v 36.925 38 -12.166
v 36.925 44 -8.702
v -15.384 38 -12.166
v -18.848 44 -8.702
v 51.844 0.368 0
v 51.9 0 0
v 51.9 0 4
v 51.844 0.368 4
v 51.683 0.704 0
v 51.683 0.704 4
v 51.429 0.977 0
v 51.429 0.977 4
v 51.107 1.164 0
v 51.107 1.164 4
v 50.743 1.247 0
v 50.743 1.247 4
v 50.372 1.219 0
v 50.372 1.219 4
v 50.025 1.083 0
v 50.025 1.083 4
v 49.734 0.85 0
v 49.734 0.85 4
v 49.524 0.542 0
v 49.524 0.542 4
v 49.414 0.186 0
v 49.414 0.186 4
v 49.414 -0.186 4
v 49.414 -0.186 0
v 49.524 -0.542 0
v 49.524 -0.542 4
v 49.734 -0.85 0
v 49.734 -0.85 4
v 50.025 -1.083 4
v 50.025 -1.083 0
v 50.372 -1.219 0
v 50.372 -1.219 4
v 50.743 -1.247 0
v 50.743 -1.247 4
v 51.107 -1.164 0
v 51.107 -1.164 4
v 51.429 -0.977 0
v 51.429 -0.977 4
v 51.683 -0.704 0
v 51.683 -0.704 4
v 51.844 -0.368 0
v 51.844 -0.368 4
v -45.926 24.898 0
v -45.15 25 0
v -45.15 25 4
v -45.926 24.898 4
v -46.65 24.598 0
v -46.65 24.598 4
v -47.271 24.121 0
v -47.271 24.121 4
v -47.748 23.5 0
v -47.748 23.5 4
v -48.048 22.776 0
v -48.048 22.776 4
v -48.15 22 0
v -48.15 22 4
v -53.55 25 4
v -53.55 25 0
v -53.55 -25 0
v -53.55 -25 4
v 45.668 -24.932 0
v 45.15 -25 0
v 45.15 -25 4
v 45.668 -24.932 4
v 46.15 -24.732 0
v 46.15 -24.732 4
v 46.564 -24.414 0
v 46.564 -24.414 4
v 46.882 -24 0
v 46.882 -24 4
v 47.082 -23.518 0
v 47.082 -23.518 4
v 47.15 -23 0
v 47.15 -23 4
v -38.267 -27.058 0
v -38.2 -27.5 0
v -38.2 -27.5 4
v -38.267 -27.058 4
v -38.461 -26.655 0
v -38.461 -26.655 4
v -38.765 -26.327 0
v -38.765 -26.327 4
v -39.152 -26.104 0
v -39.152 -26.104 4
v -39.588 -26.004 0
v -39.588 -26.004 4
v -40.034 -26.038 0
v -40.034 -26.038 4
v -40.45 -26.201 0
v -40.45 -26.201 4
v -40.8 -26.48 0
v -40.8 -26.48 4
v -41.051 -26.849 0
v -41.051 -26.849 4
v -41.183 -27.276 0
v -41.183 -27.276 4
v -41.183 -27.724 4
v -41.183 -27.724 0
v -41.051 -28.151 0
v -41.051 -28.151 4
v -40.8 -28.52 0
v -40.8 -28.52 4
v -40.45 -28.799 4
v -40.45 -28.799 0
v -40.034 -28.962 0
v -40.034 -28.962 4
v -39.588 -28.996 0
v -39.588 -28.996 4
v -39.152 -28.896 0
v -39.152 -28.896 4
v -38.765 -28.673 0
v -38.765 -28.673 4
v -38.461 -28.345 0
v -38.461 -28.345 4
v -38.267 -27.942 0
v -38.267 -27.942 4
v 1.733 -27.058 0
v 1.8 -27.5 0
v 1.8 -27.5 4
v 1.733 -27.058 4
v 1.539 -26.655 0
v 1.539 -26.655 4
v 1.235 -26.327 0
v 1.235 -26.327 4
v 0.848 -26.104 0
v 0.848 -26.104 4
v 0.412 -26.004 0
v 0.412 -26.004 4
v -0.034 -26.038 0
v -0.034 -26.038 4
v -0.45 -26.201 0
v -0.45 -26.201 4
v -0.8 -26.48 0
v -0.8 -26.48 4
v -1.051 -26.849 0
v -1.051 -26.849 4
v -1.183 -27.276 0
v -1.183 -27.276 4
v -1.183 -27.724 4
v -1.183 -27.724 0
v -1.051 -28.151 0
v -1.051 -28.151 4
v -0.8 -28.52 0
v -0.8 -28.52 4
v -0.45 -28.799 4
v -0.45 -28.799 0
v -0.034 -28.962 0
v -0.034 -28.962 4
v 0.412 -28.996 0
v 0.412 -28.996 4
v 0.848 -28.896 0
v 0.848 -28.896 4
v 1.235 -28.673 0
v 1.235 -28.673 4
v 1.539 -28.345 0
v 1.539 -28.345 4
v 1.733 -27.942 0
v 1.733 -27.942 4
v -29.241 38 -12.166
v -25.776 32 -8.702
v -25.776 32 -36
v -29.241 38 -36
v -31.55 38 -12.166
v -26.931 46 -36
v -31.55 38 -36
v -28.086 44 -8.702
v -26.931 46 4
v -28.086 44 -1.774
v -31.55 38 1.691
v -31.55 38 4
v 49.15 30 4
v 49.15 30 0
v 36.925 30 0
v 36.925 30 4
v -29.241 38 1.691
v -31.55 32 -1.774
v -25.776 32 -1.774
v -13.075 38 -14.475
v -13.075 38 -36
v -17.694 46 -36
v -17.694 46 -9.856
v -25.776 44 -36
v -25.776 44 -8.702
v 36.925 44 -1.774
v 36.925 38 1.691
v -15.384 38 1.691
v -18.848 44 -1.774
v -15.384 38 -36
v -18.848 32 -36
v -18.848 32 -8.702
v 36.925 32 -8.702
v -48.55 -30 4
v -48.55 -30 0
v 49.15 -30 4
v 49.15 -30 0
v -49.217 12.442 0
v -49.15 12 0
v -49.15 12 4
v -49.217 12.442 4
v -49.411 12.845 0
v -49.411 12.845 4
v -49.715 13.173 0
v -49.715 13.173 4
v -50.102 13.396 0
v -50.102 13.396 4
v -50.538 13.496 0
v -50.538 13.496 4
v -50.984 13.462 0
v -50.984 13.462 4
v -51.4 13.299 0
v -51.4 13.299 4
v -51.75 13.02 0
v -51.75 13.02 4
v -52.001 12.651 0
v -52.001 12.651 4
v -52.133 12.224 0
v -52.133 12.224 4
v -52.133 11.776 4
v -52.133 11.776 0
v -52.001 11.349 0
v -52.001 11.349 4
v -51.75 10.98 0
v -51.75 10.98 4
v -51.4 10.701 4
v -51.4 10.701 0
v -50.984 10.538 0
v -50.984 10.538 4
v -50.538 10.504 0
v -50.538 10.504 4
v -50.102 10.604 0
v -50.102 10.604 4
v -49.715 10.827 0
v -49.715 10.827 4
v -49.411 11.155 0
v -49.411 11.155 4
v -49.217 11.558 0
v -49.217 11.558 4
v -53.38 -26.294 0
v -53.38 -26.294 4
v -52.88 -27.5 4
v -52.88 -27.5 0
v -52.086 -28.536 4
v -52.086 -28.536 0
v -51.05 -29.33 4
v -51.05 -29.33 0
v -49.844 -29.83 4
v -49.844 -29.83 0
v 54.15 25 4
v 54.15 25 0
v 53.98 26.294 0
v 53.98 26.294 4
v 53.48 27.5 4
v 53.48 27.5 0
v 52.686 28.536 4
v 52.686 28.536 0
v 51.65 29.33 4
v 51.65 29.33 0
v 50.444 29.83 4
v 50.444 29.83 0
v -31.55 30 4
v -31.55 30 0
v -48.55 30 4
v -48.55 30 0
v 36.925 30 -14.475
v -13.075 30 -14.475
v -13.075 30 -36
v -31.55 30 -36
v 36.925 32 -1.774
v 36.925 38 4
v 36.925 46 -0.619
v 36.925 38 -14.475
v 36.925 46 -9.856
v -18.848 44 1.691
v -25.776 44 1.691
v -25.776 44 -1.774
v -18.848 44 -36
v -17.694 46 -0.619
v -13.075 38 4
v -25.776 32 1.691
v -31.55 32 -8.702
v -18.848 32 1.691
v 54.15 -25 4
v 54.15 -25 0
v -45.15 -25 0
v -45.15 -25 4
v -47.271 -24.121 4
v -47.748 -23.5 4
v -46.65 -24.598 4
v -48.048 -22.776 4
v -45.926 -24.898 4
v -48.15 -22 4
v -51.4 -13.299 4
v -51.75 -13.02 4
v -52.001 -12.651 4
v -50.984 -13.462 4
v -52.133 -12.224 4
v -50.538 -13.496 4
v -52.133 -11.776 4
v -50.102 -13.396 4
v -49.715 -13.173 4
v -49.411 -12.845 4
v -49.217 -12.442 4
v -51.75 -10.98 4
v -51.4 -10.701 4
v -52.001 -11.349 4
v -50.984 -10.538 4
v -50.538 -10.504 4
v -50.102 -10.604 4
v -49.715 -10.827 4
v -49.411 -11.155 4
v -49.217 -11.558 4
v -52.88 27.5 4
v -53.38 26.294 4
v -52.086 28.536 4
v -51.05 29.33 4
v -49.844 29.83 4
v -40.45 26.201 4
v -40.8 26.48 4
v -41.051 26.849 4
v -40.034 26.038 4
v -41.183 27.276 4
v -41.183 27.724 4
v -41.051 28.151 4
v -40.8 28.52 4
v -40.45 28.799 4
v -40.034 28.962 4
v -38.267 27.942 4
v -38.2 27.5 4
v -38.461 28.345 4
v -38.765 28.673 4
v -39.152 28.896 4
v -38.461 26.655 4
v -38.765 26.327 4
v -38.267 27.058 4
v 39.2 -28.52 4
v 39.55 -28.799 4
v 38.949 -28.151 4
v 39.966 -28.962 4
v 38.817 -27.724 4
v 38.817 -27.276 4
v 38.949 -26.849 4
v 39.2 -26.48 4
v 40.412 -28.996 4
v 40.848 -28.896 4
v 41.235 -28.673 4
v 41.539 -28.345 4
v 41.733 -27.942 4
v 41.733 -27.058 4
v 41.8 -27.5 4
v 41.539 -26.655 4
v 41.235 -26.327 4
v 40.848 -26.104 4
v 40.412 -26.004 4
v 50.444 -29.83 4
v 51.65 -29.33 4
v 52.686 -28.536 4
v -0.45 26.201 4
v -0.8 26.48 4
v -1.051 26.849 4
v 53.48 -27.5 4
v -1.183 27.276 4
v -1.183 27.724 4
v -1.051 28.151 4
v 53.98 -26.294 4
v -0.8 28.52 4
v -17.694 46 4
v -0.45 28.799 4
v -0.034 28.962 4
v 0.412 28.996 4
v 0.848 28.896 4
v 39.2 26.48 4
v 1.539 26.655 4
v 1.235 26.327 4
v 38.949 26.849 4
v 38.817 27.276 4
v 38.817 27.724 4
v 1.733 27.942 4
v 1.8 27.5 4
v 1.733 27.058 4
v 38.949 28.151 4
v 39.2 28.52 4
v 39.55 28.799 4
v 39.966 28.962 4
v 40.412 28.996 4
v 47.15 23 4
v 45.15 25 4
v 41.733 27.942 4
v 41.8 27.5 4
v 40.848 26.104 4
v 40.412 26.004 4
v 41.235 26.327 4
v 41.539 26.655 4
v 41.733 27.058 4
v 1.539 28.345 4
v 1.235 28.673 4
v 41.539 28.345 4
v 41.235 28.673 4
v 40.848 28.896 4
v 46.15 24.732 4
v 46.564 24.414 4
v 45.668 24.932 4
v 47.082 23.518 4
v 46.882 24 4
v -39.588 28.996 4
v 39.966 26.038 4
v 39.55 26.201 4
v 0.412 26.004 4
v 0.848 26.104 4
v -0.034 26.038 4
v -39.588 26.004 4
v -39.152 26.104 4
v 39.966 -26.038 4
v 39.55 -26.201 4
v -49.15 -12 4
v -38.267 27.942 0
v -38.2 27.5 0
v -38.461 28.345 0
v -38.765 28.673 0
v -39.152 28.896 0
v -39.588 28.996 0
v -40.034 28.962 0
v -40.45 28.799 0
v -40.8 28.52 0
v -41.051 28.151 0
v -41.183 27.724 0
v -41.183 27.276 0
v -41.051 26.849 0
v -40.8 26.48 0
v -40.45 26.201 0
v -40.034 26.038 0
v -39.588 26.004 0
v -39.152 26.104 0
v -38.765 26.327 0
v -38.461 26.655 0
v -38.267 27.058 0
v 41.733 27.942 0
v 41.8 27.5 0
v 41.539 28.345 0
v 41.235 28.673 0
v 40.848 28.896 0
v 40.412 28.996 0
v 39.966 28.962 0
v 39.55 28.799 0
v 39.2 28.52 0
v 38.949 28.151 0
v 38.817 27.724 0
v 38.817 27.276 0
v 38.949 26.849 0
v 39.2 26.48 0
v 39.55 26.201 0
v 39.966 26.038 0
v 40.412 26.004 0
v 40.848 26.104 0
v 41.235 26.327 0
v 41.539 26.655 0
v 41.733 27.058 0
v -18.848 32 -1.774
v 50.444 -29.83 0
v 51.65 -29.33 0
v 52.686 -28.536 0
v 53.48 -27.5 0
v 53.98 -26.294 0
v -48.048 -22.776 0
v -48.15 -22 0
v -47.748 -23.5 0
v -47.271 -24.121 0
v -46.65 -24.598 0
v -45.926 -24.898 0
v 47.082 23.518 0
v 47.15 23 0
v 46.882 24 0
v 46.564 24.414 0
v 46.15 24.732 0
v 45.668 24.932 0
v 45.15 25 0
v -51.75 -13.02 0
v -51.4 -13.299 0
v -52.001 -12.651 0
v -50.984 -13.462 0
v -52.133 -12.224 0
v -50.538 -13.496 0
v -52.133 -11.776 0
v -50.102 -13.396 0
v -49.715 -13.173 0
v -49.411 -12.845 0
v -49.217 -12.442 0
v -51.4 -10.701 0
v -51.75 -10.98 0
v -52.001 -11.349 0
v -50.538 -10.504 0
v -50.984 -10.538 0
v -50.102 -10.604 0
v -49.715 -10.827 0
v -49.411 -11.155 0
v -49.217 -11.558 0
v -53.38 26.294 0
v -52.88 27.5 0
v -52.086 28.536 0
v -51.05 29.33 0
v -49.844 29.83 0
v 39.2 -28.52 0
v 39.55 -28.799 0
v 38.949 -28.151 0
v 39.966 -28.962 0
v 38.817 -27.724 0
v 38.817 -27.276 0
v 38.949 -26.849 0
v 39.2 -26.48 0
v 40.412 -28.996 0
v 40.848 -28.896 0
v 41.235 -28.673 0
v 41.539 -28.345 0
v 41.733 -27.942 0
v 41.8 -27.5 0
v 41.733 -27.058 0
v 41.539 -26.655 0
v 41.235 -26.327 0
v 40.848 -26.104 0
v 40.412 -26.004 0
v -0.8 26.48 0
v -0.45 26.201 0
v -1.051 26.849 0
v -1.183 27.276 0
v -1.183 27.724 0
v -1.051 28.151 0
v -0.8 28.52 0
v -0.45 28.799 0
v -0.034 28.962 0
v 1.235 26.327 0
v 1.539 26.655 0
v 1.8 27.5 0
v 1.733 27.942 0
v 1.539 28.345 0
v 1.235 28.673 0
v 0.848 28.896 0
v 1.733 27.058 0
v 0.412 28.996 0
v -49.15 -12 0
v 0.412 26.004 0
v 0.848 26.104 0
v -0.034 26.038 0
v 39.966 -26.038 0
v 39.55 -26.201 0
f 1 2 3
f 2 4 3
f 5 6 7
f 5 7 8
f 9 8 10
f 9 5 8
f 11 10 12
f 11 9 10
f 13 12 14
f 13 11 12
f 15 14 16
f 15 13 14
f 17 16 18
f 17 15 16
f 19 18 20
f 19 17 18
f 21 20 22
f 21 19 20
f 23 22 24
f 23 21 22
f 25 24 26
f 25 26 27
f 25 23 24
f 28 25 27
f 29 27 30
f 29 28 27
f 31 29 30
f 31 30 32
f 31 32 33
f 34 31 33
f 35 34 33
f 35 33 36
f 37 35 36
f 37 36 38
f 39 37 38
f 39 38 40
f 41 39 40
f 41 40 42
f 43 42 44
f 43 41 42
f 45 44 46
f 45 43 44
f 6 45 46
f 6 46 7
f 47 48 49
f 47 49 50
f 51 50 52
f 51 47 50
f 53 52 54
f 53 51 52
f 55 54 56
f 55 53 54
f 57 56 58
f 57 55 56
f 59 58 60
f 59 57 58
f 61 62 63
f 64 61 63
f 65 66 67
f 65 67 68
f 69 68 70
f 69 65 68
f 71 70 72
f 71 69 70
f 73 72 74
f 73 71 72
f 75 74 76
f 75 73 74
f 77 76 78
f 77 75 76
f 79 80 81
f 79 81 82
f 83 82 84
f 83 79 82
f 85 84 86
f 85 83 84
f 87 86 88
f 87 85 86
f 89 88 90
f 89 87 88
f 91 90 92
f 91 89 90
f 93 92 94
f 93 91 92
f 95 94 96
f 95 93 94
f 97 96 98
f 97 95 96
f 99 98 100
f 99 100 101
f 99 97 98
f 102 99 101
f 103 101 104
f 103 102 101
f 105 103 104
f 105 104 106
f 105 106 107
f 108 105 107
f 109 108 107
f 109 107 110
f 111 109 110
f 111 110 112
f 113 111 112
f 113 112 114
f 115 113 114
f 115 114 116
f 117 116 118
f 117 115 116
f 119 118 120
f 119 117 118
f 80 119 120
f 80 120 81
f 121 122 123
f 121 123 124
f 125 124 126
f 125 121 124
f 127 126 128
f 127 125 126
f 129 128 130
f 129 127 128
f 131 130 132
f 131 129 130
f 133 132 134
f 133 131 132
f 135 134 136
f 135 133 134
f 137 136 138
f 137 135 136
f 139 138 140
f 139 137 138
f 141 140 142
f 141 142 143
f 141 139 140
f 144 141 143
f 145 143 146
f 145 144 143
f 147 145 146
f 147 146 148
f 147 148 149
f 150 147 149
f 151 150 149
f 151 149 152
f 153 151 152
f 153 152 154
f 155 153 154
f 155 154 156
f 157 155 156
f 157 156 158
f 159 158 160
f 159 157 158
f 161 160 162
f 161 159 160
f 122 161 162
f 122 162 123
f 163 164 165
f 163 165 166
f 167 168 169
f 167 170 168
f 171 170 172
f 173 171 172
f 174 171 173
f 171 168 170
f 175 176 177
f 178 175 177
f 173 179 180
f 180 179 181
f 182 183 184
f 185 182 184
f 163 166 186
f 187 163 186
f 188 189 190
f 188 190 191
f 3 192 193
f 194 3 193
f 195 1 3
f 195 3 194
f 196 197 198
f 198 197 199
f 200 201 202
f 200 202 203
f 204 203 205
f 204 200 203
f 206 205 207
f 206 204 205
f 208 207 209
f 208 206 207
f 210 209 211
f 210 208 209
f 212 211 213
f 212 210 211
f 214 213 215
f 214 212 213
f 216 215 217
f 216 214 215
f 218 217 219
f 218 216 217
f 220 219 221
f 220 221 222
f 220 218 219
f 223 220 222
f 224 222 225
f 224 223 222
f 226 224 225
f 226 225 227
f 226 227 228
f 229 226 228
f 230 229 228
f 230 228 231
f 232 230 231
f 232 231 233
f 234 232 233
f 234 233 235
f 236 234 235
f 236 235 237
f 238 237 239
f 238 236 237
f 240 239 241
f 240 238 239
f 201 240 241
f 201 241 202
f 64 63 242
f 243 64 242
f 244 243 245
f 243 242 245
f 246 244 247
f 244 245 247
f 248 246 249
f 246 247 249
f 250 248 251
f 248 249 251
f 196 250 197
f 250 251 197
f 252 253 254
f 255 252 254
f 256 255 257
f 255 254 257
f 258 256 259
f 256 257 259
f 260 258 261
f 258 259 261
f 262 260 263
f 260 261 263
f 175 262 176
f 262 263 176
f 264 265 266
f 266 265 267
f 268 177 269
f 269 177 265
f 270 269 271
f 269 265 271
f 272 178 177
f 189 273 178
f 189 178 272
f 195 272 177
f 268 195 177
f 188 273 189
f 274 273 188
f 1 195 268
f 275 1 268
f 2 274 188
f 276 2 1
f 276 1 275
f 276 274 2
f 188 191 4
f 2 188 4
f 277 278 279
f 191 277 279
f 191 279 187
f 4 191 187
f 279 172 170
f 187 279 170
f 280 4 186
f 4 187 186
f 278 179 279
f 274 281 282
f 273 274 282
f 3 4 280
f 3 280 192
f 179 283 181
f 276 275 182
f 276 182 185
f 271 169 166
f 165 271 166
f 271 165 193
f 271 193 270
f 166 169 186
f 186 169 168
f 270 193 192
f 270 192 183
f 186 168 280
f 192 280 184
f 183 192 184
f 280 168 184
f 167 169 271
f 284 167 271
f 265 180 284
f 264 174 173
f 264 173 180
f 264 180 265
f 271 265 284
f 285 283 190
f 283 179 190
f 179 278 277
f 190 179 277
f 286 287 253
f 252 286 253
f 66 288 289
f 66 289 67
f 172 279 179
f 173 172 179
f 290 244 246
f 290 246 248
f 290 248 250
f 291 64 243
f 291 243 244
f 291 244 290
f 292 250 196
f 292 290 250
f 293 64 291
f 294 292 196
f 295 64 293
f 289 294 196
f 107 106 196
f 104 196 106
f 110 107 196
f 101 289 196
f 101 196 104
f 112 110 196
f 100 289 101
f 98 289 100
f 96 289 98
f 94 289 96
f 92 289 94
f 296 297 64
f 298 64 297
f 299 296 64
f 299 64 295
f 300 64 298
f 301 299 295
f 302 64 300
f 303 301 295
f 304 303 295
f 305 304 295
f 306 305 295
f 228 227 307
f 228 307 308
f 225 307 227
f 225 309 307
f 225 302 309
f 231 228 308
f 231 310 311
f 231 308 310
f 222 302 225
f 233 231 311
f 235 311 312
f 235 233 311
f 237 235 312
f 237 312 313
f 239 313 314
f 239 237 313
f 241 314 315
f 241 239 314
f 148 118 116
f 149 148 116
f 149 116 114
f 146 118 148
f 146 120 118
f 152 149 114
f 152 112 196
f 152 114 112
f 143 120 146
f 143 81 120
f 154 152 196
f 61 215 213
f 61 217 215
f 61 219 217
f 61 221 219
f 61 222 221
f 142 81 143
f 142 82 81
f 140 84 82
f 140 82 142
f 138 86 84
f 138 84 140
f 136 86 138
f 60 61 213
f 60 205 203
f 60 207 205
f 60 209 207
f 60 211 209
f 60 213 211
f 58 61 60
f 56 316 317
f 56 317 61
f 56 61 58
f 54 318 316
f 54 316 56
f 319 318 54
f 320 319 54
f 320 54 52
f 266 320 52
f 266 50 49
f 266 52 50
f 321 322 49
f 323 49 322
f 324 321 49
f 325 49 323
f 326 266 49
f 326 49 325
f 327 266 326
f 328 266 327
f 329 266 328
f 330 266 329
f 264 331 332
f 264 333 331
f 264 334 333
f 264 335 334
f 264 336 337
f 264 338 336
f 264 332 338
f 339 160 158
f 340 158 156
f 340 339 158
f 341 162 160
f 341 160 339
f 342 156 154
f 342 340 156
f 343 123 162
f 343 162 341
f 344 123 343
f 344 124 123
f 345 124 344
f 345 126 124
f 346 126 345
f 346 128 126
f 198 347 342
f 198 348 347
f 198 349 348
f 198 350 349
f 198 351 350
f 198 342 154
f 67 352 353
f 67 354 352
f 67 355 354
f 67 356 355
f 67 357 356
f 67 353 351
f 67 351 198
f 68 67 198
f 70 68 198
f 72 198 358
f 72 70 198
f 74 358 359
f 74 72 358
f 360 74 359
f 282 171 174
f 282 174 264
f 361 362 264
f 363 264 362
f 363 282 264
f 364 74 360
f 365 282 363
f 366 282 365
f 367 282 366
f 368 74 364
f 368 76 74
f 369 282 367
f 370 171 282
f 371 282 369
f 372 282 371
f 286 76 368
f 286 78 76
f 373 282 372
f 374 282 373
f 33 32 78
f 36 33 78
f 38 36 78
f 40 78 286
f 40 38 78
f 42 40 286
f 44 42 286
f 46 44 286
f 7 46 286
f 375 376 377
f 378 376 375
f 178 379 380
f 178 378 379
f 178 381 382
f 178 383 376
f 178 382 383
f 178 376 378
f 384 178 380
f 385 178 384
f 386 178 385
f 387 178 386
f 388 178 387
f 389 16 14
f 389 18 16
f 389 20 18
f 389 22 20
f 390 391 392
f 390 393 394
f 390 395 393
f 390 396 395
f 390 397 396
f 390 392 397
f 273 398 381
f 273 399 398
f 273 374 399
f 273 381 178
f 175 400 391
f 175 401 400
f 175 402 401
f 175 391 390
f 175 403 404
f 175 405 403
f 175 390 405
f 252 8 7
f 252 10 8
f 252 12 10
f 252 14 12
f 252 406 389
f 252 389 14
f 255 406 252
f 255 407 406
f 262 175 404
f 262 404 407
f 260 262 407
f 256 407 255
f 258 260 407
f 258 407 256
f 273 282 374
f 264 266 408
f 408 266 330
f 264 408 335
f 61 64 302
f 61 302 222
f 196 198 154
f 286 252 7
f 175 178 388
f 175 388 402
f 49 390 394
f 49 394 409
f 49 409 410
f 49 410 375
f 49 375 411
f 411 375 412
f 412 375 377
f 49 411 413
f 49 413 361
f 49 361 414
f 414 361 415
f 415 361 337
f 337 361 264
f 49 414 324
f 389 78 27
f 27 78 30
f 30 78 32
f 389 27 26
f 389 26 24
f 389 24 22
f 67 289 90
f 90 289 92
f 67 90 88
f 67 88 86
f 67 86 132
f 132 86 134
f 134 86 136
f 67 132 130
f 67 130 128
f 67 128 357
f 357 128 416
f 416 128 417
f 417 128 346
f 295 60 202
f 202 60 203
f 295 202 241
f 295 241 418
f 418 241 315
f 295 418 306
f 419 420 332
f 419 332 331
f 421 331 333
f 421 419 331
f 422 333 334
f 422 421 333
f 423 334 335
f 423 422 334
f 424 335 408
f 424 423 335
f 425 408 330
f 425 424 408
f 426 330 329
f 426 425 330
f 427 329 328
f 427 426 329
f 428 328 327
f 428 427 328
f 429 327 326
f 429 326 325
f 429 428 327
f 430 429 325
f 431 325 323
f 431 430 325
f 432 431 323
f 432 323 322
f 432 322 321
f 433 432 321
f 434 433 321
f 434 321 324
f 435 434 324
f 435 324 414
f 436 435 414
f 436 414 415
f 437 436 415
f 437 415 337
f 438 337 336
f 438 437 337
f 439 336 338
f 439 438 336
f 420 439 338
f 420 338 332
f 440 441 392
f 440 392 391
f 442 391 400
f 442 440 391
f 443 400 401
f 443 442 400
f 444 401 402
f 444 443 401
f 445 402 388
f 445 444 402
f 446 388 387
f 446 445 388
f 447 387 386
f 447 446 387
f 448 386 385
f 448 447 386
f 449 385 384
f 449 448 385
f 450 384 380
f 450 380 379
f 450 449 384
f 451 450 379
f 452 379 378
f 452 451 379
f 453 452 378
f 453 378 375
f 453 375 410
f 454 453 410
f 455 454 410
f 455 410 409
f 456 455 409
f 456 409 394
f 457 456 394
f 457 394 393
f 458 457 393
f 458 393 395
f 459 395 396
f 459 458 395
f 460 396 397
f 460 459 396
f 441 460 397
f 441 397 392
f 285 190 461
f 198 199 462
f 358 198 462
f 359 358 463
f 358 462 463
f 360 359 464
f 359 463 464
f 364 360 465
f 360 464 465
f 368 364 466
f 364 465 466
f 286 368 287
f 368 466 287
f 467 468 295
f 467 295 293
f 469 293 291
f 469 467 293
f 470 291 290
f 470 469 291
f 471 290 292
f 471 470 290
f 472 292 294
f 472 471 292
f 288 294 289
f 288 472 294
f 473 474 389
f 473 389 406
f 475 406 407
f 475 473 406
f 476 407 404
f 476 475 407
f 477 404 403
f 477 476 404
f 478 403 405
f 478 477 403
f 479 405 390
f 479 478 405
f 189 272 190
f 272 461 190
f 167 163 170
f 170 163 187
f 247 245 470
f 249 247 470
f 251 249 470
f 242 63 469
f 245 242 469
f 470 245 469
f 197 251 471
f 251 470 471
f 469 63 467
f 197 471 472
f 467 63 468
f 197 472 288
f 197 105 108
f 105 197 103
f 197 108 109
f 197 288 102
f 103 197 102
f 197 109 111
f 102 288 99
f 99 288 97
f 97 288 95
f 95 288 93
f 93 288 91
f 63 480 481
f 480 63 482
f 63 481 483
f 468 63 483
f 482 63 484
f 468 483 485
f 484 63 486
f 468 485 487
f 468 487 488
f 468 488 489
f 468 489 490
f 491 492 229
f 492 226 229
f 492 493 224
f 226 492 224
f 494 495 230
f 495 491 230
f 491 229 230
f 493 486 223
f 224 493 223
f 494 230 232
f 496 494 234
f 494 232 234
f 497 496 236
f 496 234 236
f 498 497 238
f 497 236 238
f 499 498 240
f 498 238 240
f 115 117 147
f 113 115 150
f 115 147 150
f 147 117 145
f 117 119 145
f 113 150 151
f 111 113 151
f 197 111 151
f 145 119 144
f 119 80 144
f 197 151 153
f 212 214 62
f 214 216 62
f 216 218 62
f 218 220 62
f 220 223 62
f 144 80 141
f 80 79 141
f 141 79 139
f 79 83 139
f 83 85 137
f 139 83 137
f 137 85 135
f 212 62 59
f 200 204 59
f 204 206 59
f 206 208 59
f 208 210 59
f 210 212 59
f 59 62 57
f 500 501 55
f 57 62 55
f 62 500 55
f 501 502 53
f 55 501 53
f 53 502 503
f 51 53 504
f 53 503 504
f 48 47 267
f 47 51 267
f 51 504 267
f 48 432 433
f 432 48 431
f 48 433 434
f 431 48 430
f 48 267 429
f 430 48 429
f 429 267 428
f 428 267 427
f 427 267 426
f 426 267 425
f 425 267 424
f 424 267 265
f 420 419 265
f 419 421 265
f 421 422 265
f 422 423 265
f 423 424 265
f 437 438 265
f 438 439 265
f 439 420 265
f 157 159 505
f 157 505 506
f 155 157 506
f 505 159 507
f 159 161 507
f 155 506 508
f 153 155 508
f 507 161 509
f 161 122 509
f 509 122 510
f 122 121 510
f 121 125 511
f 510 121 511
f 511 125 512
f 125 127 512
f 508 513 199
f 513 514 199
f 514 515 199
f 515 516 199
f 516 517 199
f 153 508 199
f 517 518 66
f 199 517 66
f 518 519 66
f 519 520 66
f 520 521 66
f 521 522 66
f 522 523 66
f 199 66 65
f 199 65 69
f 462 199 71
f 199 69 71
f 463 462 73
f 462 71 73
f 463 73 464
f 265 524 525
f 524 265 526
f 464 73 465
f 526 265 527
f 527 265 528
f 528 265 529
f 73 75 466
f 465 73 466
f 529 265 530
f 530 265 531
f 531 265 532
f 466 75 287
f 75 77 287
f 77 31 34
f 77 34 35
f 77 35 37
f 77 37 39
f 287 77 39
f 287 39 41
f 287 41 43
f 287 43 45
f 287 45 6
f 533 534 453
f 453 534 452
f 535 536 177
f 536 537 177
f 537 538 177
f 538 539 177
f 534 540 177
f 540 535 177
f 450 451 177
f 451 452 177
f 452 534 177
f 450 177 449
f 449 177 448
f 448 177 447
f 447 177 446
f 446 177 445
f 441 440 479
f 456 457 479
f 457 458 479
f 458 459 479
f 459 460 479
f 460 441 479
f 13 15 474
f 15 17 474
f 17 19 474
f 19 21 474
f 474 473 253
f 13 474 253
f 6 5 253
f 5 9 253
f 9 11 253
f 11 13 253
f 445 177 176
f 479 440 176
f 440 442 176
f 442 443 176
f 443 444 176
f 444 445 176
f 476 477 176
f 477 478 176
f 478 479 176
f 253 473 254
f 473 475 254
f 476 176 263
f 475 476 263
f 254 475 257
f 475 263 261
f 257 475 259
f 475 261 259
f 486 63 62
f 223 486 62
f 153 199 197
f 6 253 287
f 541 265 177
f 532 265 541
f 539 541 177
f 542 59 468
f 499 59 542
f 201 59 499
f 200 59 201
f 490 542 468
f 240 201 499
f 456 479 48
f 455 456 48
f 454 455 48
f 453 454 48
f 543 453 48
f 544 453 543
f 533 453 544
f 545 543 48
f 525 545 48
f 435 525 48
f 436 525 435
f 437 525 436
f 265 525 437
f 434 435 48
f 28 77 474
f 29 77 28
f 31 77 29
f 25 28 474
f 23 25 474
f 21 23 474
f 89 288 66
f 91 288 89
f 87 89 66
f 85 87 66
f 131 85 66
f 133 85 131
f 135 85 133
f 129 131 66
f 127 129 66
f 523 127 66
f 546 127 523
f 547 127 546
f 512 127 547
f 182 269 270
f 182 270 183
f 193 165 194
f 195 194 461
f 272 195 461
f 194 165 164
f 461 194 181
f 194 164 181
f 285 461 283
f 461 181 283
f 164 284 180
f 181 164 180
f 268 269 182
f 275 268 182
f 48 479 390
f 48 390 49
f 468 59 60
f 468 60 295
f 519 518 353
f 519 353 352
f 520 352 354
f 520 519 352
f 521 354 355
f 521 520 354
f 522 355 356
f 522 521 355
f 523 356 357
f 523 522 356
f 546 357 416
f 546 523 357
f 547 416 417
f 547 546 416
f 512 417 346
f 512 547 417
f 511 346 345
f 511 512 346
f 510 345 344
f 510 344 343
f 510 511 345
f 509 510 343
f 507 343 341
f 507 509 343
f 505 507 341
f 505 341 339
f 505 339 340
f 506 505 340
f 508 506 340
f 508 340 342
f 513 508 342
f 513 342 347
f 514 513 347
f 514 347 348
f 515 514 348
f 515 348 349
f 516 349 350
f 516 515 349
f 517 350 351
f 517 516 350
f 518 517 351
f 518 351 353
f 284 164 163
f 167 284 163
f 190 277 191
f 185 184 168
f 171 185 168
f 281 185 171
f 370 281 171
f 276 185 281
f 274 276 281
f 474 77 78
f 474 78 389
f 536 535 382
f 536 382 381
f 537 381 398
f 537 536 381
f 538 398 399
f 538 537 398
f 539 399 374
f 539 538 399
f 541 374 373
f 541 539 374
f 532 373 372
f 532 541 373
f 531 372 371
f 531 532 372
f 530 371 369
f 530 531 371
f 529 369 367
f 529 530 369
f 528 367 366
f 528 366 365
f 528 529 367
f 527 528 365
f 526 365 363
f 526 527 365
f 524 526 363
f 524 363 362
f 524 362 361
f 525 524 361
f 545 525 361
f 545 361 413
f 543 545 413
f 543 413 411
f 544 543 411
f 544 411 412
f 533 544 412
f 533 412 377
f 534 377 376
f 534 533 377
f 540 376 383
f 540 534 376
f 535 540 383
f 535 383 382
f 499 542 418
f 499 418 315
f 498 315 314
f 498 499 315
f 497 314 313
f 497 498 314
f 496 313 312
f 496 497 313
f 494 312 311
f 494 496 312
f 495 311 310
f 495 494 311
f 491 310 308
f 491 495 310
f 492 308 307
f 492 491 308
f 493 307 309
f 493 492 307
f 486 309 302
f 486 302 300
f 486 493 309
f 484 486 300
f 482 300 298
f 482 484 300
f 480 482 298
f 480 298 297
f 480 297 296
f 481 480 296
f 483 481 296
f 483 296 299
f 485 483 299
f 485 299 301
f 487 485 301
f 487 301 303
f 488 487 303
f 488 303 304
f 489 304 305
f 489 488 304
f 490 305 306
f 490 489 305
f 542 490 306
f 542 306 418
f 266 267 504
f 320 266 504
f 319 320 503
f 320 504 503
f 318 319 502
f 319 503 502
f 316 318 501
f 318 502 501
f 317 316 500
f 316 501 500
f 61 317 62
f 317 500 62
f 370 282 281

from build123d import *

# Parameters (mm, degrees)
SKETCH3_R           = 1.5
SKETCH3_R_2         = 1.25
BOSS_EXTRUDE1_DEPTH = 4
BOSS_EXTRUDE2_DEPTH = 40
BOSS_EXTRUDE5_DEPTH = 50
BOSS_EXTRUDE6_REACH = 91.057
CUT_EXTRUDE2_DEPTH  = 90.057130972
BOSS_EXTRUDE7_DEPTH = 2.3094


with BuildPart() as part:
    # Sketch3 → Boss-Extrude1 (new body)
    with BuildSketch(Plane.XY):
        with BuildLine():
            Line((-53.55, 25), (-53.55, -25))
            ThreePointArc((-53.55, -25), (-52.085533906, -28.535533906), (-48.55, -30))
            Line((-48.55, -30), (49.15, -30))
            ThreePointArc((49.15, -30), (52.685533906, -28.535533906), (54.15, -25))
            Line((54.15, -25), (54.15, 25))
            ThreePointArc((54.15, 25), (52.685533906, 28.535533906), (49.15, 30))
            Line((49.15, 30), (-48.55, 30))
            ThreePointArc((-48.55, 30), (-52.085533906, 28.535533906), (-53.55, 25))
        make_face()
        with Locations((-39.7, 27.5)):
            Circle(SKETCH3_R, mode=Mode.SUBTRACT)
        with Locations((40.3, 27.5)):
            Circle(SKETCH3_R, mode=Mode.SUBTRACT)
        with Locations((40.3, -27.5)):
            Circle(SKETCH3_R, mode=Mode.SUBTRACT)
        with Locations((0.3, -27.5)):
            Circle(SKETCH3_R, mode=Mode.SUBTRACT)
        with Locations((-50.65, -12)):
            Circle(SKETCH3_R, mode=Mode.SUBTRACT)
        with Locations((-50.65, 12)):
            Circle(SKETCH3_R, mode=Mode.SUBTRACT)
        with Locations((-39.7, -27.5)):
            Circle(SKETCH3_R, mode=Mode.SUBTRACT)
        with Locations((0.3, 27.5)):
            Circle(SKETCH3_R, mode=Mode.SUBTRACT)
        with Locations((50.65, 0)):
            Circle(SKETCH3_R_2, mode=Mode.SUBTRACT)
        with BuildLine():
            Line((-48.15, 22), (-48.15, -22))
            ThreePointArc((-48.15, -22), (-47.271320344, -24.121320344), (-45.15, -25))
            Line((-45.15, -25), (45.15, -25))
            ThreePointArc((45.15, -25), (46.564213562, -24.414213562), (47.15, -23))
            Line((47.15, -23), (47.15, 23))
            ThreePointArc((47.15, 23), (46.564213562, 24.414213562), (45.15, 25))
            Line((45.15, 25), (-45.15, 25))
            ThreePointArc((-45.15, 25), (-47.271320344, 24.121320344), (-48.15, 22))
        make_face(mode=Mode.SUBTRACT)
    extrude(amount=BOSS_EXTRUDE1_DEPTH)

    # Sketch5 → Boss-Extrude2 (add)
    # profile 1 of 3: a face of its own
    with BuildSketch(Plane.XY.offset(4)):
        Polygon((-17.693593539, 30), (-13.074791386, 38), (-17.693593539, 46), (-26.931197846, 46), (-31.55, 38), (-26.931197846, 30), align=None)
        Polygon((-18.848294078, 44), (-15.384192463, 38), (-18.848294078, 32), (-25.776497308, 32), (-29.240598923, 38), (-25.776497308, 44), align=None, mode=Mode.SUBTRACT)
    # profile 2 of 3: a face of its own
    with BuildSketch(Plane.XY.offset(4)):
        Polygon((-13.074791386, 30), (-13.074791386, 38), (-17.693593539, 30), align=None)
    # profile 3 of 3: a face of its own
    with BuildSketch(Plane.XY.offset(4)):
        Polygon((-31.55, 30), (-26.931197846, 30), (-31.55, 38), align=None)
    extrude(amount=-BOSS_EXTRUDE2_DEPTH)

    # Sketch8 → Boss-Extrude5 (add)
    with BuildSketch(Plane(origin=(-13.074791386, 0, 0), x_dir=(0, 0, -1), z_dir=(1, 0, 0))):
        Polygon((0, 30), (0.618802154, 30), (-4, 38), (-4, 30), align=None)
        Polygon((9.856406461, 30), (14.475208614, 38), (12.165807537, 38), (8.701705922, 32), (1.773502692, 32), (-1.690598923, 38), (-4, 38), (0.618802154, 30), align=None)
        Polygon((14.475208614, 30), (14.475208614, 38), (9.856406461, 30), align=None)
        Polygon((12.165807537, 38), (14.475208614, 38), (9.856406461, 46), (0.618802154, 46), (-4, 38), (-1.690598923, 38), (1.773502692, 44), (8.701705922, 44), align=None)
    extrude(amount=BOSS_EXTRUDE5_DEPTH)

    # Boss-Extrude6: up to this face of the body (flat: up to its plane)
    boss_extrude6_end = Plane(part.part.faces().sort_by_distance((-15.384192463, 42, -16))[0])
    # Sketch8<3> → Boss-Extrude6 (add, up to the picked face)
    with BuildSketch(Plane(origin=(-13.074791386, 0, 0), x_dir=(0, 0, -1), z_dir=(1, 0, 0)), mode=Mode.PRIVATE) as boss_extrude6_sk1:
        Polygon((12.165807537, 38), (14.475208614, 38), (9.856406461, 46), (0.618802154, 46), (-4, 38), (-1.690598923, 38), (1.773502692, 44), (8.701705922, 44), align=None)
    boss_extrude6_tool1 = split(extrude(boss_extrude6_sk1.sketch, amount=-BOSS_EXTRUDE6_REACH, mode=Mode.PRIVATE), bisect_by=boss_extrude6_end, keep=Keep.BOTH, mode=Mode.PRIVATE)
    add(boss_extrude6_tool1.solids().sort_by(Axis((-13.074791, 38.201329, -13.320508), (-1, 0, 0)))[0])

    # Sketch8<4> → Cut-Extrude2 (cut, through all)
    with BuildSketch(Plane(origin=(-13.074791386, 0, 0), x_dir=(0, 0, -1), z_dir=(1, 0, 0))):
        Polygon((-1.690598923, 38), (12.165807537, 38), (8.701705922, 44), (1.773502692, 44), align=None)
        Polygon((8.701705922, 32), (12.165807537, 38), (-1.690598923, 38), (1.773502692, 32), align=None)
    extrude(amount=-CUT_EXTRUDE2_DEPTH, mode=Mode.SUBTRACT)

    # Sketch5<3> → Boss-Extrude7 (add)
    with BuildSketch(Plane.XY.offset(4)):
        Polygon((-25.776497308, 32), (-18.848294078, 32), (-15.384192463, 38), (-18.848294078, 44), (-25.776497308, 44), (-29.240598923, 38), align=None)
    extrude(amount=-BOSS_EXTRUDE7_DEPTH)


solid = part.part
